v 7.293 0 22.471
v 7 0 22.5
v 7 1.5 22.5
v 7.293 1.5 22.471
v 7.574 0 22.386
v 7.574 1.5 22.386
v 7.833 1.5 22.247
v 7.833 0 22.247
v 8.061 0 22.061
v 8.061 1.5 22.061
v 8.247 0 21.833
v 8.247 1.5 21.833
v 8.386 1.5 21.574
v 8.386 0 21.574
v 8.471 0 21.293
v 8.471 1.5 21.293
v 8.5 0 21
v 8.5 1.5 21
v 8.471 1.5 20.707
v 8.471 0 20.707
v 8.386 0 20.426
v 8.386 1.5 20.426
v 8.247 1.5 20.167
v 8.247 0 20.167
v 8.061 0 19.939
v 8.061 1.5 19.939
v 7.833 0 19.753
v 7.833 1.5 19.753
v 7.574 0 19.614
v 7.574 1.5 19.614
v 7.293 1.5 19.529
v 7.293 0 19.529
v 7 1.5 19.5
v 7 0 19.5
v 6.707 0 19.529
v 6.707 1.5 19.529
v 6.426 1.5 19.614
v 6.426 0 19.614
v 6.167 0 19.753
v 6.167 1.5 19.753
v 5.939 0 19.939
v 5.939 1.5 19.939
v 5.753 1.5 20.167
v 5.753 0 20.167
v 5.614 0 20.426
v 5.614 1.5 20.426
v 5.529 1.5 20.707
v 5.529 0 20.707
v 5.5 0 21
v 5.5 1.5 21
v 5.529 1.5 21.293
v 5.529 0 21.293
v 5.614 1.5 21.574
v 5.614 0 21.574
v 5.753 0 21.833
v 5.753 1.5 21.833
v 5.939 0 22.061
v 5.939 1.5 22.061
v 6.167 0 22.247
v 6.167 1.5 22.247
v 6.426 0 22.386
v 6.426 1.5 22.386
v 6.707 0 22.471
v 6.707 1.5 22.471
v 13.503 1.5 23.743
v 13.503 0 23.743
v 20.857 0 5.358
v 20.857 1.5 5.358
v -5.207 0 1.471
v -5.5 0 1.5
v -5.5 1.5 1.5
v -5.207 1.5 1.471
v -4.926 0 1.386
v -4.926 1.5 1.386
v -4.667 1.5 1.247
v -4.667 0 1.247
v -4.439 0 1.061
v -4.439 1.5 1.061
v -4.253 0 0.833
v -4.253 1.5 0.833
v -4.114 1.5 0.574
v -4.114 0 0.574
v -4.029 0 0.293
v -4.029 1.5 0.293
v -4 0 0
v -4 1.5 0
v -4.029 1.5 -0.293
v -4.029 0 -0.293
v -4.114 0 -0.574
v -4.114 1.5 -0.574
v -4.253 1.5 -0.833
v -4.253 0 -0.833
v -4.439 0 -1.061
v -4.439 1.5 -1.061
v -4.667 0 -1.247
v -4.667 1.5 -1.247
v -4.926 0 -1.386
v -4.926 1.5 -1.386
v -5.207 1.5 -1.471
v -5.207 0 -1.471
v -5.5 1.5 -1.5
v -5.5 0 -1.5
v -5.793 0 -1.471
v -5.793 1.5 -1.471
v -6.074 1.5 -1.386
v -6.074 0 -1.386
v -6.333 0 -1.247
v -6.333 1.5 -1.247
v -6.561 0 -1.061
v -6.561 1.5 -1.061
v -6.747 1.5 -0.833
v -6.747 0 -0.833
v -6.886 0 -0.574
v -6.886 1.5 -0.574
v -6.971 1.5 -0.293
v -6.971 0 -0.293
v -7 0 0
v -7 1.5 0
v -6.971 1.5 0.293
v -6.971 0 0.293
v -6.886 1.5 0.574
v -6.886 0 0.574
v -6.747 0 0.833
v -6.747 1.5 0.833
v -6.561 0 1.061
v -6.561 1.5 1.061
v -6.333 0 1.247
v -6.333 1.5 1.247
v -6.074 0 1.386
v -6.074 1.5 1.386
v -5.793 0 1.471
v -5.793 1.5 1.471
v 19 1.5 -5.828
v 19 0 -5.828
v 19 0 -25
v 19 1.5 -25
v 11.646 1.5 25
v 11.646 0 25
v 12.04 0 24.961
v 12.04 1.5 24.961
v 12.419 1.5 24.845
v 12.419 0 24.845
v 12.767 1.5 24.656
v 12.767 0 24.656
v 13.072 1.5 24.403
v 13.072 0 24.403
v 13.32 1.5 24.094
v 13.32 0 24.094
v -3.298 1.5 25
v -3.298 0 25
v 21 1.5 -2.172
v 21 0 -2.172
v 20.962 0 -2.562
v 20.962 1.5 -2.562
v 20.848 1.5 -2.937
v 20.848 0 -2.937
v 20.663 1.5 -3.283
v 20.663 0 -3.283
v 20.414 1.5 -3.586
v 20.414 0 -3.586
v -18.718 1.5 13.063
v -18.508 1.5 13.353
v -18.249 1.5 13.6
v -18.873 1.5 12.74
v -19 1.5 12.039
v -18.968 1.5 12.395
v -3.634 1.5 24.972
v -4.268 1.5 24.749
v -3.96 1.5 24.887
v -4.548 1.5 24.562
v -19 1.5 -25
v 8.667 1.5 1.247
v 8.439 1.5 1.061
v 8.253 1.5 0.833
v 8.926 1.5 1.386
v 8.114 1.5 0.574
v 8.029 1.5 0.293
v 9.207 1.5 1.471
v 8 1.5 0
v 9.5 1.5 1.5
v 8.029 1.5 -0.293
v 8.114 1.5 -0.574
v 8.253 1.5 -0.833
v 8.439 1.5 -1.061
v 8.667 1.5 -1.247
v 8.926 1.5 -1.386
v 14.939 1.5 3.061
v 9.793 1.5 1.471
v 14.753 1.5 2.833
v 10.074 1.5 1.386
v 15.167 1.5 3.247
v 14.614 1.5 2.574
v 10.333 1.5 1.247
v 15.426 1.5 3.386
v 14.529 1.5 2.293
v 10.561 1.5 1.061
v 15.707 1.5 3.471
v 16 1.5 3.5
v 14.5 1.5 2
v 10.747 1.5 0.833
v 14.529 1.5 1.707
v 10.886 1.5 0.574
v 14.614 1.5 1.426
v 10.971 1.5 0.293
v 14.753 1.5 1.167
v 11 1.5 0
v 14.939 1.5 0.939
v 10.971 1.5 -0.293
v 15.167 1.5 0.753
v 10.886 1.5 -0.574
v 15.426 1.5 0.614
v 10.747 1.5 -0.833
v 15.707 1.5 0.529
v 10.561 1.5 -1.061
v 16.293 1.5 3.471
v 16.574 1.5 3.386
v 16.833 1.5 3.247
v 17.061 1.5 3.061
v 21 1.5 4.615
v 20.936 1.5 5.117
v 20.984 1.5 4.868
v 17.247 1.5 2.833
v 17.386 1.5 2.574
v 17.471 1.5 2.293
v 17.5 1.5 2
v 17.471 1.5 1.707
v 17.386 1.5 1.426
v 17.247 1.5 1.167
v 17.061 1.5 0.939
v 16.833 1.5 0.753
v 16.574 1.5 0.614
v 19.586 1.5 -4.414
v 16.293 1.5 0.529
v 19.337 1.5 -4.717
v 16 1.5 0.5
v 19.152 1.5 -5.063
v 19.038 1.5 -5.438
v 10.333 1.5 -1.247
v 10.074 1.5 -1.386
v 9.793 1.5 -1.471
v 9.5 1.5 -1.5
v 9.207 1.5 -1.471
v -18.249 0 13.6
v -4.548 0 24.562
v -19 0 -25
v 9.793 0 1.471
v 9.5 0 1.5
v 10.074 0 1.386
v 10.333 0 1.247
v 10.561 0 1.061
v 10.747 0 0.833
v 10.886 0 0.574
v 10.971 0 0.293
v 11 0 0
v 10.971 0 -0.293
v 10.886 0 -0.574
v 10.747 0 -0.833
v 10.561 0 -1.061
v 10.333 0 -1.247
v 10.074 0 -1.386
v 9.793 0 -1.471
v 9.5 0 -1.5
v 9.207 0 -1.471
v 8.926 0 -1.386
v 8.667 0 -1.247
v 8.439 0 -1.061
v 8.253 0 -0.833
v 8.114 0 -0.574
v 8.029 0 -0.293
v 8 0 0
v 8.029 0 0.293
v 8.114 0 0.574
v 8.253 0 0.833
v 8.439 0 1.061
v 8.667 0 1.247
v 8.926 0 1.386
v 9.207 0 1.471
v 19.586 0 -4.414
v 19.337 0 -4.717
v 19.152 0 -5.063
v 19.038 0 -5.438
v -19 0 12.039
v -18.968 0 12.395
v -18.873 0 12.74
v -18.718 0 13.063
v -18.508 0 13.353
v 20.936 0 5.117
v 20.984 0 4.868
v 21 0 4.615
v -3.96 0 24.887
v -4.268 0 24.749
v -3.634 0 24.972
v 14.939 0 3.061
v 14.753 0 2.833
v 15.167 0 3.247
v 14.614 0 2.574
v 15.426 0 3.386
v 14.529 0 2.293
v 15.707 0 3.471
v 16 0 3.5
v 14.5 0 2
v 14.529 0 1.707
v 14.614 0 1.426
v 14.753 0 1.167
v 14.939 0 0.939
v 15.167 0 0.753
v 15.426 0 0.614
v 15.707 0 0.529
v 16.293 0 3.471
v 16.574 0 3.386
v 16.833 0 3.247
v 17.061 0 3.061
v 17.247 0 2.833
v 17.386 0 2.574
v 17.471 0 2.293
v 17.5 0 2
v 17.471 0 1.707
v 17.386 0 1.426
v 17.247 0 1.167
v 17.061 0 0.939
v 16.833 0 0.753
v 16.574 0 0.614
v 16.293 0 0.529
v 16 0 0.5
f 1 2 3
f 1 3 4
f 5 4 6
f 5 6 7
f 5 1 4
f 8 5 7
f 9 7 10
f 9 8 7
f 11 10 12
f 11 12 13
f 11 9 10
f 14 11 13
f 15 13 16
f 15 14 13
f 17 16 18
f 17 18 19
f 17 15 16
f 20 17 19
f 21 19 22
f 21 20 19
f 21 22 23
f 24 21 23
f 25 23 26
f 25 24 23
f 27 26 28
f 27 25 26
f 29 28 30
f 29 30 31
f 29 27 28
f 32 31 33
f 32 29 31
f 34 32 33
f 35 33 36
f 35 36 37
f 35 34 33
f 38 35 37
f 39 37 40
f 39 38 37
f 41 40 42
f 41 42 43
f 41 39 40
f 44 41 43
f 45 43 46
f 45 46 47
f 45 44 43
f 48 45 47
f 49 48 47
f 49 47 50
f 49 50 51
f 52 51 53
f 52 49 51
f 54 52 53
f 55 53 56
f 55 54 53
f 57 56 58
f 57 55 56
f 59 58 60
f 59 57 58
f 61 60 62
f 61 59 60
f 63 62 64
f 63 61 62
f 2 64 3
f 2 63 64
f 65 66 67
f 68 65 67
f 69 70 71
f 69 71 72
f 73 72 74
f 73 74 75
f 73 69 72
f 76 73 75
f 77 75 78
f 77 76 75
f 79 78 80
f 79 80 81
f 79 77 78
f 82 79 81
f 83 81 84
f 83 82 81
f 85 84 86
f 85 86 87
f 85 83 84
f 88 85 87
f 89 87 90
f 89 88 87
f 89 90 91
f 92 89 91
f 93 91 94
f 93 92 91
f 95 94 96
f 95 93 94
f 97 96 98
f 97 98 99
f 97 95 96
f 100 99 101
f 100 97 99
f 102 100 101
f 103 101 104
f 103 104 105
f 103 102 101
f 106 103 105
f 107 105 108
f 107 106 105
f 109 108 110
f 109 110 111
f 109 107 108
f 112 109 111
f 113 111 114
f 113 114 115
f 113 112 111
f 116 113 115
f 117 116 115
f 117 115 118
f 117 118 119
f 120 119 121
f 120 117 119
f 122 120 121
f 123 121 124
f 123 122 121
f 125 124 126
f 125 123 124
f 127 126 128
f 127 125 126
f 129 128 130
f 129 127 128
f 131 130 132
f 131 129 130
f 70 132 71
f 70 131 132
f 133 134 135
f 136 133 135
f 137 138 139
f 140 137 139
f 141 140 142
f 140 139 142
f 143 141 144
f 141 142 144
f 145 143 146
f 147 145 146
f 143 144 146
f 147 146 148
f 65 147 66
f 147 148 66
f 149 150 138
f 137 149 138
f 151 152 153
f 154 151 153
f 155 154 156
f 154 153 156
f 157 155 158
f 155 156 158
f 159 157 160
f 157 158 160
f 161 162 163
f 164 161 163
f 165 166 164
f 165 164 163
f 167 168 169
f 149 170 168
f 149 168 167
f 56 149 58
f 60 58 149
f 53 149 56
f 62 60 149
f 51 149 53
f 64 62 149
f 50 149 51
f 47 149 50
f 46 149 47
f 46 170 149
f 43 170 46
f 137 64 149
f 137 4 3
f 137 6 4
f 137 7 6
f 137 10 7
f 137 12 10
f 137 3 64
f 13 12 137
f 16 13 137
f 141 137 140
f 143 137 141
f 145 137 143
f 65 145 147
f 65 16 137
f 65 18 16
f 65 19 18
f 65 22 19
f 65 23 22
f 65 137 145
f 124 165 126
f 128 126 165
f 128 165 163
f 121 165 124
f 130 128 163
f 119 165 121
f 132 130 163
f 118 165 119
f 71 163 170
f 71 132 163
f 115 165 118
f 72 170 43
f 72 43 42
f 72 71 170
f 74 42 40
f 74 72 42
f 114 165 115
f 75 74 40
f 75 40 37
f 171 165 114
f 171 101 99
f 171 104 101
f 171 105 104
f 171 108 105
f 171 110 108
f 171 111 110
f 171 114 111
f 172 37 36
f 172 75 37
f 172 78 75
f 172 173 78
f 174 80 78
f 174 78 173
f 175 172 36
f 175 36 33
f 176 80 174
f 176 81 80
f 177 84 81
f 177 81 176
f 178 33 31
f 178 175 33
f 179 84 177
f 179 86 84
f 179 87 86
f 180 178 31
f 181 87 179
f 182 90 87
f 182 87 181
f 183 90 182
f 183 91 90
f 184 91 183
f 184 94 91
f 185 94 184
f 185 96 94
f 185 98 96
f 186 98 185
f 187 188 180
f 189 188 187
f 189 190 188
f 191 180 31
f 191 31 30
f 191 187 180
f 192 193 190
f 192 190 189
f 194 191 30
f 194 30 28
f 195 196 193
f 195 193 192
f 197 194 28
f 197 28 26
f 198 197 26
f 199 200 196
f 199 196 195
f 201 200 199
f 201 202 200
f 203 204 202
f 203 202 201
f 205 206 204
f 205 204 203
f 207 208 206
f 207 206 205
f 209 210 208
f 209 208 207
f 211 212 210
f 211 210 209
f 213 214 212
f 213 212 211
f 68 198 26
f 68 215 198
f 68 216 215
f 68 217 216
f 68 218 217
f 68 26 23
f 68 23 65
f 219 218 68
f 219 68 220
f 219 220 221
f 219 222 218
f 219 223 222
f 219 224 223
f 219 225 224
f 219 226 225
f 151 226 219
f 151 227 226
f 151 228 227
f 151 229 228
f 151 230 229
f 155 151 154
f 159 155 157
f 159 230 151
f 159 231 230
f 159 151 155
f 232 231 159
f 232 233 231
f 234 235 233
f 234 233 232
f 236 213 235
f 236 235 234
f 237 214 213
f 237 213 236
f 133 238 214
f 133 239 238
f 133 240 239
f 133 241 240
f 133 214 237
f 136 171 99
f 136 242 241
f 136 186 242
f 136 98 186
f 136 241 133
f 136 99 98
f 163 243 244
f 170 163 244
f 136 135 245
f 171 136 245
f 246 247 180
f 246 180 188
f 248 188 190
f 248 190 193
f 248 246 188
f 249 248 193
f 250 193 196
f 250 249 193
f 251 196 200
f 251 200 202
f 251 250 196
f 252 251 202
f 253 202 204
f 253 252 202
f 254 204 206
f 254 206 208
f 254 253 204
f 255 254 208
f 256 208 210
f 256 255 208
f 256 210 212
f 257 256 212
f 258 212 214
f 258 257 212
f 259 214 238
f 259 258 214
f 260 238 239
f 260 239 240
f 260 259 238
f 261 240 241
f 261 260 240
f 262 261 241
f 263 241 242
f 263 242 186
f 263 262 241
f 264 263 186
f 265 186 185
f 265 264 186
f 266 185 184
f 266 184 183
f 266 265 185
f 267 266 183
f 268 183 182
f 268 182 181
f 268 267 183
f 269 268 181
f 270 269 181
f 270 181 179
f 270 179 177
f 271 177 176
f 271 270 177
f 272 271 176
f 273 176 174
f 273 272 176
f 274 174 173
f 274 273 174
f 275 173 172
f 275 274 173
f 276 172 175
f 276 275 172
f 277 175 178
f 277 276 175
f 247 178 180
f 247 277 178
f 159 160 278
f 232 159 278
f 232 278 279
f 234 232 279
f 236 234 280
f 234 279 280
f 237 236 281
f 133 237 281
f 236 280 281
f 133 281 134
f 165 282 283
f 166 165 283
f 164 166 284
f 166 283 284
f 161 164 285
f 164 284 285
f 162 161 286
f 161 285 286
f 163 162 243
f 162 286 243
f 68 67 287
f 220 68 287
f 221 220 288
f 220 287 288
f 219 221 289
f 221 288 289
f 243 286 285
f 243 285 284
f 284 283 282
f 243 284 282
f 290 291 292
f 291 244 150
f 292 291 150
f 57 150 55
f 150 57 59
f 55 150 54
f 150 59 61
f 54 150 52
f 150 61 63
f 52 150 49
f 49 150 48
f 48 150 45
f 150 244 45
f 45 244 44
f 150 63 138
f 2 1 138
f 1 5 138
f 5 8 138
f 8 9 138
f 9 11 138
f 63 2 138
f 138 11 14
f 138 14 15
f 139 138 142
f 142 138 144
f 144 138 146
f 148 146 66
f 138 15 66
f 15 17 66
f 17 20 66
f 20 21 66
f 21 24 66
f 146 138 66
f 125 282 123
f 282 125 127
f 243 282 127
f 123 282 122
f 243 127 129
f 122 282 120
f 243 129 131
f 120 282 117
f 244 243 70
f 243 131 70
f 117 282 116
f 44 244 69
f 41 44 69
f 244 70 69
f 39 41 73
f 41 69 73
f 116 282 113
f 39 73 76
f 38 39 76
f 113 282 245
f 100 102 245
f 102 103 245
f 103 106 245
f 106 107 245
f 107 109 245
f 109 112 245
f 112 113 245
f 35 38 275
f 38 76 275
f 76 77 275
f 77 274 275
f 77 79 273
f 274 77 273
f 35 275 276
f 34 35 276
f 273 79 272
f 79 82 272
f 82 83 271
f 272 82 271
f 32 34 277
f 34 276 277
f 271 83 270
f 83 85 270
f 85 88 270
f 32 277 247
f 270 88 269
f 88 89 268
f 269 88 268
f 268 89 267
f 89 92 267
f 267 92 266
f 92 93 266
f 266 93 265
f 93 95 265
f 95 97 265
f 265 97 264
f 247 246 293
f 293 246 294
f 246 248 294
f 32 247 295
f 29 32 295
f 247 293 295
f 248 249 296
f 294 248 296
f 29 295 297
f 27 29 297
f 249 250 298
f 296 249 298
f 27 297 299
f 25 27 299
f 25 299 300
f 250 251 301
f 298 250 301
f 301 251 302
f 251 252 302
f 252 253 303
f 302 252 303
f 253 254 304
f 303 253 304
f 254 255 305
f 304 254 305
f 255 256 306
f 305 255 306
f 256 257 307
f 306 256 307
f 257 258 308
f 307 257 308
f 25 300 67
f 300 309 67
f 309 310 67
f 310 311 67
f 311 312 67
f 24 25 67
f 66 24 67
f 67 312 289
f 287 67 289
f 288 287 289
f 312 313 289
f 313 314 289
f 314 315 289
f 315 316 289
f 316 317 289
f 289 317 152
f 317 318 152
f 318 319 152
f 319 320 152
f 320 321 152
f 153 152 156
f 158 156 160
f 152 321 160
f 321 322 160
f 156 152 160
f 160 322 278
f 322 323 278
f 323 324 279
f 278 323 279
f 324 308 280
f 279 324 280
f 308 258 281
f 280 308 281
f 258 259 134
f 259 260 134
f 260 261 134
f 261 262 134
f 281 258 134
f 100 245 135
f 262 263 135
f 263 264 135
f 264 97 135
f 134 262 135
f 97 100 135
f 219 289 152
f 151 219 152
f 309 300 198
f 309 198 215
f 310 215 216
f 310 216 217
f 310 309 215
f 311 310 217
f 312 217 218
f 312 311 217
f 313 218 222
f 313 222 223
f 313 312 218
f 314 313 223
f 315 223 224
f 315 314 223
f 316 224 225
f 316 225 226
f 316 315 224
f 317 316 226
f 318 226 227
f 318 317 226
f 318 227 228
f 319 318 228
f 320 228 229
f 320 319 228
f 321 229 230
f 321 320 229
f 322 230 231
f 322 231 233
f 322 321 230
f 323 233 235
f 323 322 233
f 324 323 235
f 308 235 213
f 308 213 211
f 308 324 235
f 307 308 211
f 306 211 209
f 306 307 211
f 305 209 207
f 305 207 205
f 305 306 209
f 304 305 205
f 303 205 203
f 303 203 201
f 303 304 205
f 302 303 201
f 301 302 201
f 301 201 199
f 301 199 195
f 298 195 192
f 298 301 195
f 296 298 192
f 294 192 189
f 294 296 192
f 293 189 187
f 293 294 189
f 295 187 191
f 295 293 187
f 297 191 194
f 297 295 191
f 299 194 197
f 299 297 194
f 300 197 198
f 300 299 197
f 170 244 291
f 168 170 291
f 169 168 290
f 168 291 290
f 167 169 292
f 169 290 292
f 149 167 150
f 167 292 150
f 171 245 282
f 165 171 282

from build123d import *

# Parameters (mm, degrees)
ESBO_O1_R                = 1.5
RESSALTO_EXTRUS_O1_DEPTH = 1.5


with BuildPart() as part:
    # Esboço1 → Ressalto-extrusão1 (new body)
    with BuildSketch(Plane(origin=(0, 0, 0), x_dir=(1, 0, 0), z_dir=(0, 1, 0))):
        with BuildLine():
            Line((-19, 25), (-19, -12.038750305))
            ThreePointArc((-19, -12.038750305), (-18.802606473, -12.905127766), (-18.249390095, -13.600487924))
            Line((-18.249390095, -13.600487924), (-4.547827976, -24.561737619))
            ThreePointArc((-4.547827976, -24.561737619), (-3.960451764, -24.887256638), (-3.298437881, -25))
            Line((-3.298437881, -25), (4.712, -25))
            Line((4.712, -25), (11.645934077, -25))
            ThreePointArc((11.645934077, -25), (12.767191696, -24.656134461), (13.502887459, -23.742781353))
            Line((13.502887459, -23.742781353), (20.856953382, -5.357616546))
            ThreePointArc((20.856953382, -5.357616546), (20.963912773, -4.993050235), (21, -4.614835193))
            Line((21, -4.614835193), (21, 2.171572875))
            ThreePointArc((21, 2.171572875), (20.847759065, 2.93693974), (20.414213562, 3.585786438))
            Line((20.414213562, 3.585786438), (19.585786438, 4.414213562))
            ThreePointArc((19.585786438, 4.414213562), (19.152240935, 5.06306026), (19, 5.828427125))
            Line((19, 5.828427125), (19, 25))
            Line((19, 25), (-19, 25))
        make_face()
        with Locations(Location((7, -21, 0), (0, 0, 270))):
            Circle(ESBO_O1_R, mode=Mode.SUBTRACT)
        with Locations(Location((9.5, 0, 0), (0, 0, 270))):
            Circle(ESBO_O1_R, mode=Mode.SUBTRACT)
        with Locations(Location((16, -2, 0), (0, 0, 270))):
            Circle(ESBO_O1_R, mode=Mode.SUBTRACT)
        with Locations(Location((-5.5, 0, 0), (0, 0, 270))):
            Circle(ESBO_O1_R, mode=Mode.SUBTRACT)
    extrude(amount=RESSALTO_EXTRUS_O1_DEPTH)


solid = part.part
